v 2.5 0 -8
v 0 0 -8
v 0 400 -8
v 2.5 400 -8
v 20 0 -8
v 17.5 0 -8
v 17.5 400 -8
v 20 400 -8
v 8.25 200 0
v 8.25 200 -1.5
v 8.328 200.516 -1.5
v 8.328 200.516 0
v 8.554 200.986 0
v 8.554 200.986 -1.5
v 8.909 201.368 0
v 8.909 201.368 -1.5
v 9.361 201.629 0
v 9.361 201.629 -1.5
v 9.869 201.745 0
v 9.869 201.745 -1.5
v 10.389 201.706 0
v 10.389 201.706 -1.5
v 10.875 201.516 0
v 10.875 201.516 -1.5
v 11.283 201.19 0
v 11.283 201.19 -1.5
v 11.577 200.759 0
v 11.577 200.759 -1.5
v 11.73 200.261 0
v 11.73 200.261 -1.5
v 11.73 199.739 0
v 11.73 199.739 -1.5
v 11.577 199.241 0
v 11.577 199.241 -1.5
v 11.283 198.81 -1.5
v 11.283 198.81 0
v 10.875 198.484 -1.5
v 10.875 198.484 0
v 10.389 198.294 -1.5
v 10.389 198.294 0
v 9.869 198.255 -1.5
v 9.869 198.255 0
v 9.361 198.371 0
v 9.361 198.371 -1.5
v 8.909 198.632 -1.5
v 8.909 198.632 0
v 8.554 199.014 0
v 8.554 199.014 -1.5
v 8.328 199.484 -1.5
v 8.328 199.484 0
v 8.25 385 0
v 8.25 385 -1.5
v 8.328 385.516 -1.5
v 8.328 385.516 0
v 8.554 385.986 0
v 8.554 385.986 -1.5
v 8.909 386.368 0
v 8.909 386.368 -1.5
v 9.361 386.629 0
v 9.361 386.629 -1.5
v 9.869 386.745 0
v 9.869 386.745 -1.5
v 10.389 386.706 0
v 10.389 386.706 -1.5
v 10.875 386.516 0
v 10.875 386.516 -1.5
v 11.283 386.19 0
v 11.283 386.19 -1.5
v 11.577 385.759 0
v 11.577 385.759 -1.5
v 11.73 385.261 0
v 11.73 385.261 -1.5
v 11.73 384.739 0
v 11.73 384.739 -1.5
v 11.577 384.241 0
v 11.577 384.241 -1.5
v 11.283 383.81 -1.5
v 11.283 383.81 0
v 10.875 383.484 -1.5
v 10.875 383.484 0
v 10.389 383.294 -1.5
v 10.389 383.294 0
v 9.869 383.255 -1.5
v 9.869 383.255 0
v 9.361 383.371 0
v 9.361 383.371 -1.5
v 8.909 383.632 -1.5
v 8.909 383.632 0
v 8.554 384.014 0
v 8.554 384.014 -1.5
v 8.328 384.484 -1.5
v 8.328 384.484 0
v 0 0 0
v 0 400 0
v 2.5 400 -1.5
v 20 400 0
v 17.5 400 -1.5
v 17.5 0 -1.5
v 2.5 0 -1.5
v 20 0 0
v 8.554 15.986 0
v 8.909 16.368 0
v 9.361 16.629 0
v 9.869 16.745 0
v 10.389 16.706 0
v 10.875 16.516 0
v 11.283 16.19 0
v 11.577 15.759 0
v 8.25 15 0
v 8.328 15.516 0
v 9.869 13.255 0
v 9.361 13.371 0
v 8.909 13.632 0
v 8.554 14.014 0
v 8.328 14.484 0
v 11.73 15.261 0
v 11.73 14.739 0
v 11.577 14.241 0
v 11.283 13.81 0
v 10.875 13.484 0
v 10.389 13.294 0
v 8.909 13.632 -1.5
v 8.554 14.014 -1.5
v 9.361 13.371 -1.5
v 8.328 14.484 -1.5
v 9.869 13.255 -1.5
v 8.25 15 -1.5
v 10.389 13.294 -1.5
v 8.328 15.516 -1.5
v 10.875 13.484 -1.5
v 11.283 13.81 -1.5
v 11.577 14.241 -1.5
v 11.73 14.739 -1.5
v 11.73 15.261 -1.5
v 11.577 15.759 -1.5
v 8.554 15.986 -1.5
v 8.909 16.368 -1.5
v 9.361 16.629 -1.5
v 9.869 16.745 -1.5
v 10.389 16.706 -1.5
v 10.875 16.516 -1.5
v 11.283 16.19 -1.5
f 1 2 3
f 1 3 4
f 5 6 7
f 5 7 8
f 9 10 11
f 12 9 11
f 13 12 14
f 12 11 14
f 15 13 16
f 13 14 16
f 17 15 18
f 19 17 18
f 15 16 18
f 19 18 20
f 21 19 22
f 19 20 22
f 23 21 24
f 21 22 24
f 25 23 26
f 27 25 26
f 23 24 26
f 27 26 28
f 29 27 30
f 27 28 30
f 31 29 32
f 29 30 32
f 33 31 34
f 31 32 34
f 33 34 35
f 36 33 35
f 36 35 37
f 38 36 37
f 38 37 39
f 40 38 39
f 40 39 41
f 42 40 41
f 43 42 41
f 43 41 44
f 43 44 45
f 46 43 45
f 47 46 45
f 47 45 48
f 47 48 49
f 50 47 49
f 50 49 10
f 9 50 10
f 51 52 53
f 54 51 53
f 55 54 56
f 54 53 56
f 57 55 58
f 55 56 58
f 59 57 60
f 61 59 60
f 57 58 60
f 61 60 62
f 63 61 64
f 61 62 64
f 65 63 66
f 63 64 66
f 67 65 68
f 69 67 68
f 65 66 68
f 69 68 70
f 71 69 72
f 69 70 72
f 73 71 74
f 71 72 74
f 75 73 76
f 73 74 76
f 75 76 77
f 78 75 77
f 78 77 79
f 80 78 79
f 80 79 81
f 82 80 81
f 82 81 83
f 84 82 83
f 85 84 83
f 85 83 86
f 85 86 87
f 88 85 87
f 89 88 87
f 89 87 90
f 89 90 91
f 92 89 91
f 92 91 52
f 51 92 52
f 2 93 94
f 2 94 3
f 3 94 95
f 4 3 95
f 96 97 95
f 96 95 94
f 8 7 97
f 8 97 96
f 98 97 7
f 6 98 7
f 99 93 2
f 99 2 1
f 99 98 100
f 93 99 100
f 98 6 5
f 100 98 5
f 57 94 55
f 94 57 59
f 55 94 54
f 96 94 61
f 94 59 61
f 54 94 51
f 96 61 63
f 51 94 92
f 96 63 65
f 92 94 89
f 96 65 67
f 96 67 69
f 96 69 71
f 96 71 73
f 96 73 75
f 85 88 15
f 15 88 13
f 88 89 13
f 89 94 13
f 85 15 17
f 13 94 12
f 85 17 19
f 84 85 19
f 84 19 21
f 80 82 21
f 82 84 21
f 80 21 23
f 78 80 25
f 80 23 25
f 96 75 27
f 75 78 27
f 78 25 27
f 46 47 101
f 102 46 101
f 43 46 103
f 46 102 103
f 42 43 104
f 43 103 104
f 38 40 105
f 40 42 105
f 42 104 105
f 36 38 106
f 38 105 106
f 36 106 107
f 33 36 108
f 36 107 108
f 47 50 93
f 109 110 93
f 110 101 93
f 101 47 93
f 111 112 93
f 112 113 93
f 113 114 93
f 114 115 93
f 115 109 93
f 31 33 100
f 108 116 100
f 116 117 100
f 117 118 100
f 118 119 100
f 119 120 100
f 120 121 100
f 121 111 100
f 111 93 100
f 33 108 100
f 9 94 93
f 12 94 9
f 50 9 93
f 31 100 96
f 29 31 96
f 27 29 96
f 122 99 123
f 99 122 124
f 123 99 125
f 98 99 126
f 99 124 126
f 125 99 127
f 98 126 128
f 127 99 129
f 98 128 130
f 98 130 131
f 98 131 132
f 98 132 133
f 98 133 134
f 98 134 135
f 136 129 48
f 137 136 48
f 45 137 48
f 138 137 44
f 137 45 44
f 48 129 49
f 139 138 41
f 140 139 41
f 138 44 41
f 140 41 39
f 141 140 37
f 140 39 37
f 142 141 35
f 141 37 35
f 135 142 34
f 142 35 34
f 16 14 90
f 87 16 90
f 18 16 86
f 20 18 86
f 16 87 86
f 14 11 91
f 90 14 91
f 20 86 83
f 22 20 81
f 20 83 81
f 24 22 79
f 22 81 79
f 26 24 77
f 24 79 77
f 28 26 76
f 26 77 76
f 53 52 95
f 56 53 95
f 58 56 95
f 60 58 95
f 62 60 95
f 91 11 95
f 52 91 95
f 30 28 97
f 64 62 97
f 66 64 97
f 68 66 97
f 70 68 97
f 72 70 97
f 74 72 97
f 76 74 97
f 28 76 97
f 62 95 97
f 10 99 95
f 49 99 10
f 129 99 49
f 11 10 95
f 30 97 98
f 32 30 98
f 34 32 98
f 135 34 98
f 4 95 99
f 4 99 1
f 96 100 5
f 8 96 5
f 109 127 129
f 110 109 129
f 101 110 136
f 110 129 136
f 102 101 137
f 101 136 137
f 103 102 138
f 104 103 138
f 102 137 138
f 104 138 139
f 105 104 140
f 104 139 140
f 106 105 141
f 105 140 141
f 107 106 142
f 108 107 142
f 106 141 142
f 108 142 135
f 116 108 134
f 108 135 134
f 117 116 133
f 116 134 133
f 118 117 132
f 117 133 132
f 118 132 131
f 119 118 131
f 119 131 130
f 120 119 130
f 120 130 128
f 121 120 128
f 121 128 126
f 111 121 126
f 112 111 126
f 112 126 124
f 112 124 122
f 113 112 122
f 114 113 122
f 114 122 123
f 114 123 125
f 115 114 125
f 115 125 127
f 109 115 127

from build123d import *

# Parameters (mm, degrees)
SKETCH1_W           = 20
SKETCH1_H           = 8
BOSS_EXTRUDE1_DEPTH = 400
SKETCH2_W           = 15
SKETCH2_H           = 13
CUT_EXTRUDE1_DEPTH  = 401
SKETCH3_R           = 1.75
CUT_EXTRUDE2_DEPTH  = 2.5


with BuildPart() as part:
    # Sketch1 → Boss-Extrude1 (new body)
    with BuildSketch(Plane(origin=(0, 0, 0), x_dir=(1, 0, 0), z_dir=(0, 1, 0))):
        with Locations((10, 4)):
            Rectangle(SKETCH1_W, SKETCH1_H)
    extrude(amount=BOSS_EXTRUDE1_DEPTH)

    # Sketch2 → Cut-Extrude1 (cut, through all)
    with BuildSketch(Plane(origin=(0, 400, 0), x_dir=(1, 0, 0), z_dir=(0, 1, 0))):
        with Locations((10, 8)):
            Rectangle(SKETCH2_W, SKETCH2_H)
    extrude(amount=-CUT_EXTRUDE1_DEPTH, mode=Mode.SUBTRACT)

    # Sketch3 → Cut-Extrude2 (cut, through all)
    with BuildSketch(Plane(origin=(0, 0, -1.5), x_dir=(-1, 0, 0), z_dir=(0, 0, -1))):
        with Locations((-10, 385)):
            Circle(SKETCH3_R)
        with Locations((-10, 200)):
            Circle(SKETCH3_R)
        with Locations((-10, 15)):
            Circle(SKETCH3_R)
    extrude(amount=-CUT_EXTRUDE2_DEPTH, mode=Mode.SUBTRACT)


solid = part.part
